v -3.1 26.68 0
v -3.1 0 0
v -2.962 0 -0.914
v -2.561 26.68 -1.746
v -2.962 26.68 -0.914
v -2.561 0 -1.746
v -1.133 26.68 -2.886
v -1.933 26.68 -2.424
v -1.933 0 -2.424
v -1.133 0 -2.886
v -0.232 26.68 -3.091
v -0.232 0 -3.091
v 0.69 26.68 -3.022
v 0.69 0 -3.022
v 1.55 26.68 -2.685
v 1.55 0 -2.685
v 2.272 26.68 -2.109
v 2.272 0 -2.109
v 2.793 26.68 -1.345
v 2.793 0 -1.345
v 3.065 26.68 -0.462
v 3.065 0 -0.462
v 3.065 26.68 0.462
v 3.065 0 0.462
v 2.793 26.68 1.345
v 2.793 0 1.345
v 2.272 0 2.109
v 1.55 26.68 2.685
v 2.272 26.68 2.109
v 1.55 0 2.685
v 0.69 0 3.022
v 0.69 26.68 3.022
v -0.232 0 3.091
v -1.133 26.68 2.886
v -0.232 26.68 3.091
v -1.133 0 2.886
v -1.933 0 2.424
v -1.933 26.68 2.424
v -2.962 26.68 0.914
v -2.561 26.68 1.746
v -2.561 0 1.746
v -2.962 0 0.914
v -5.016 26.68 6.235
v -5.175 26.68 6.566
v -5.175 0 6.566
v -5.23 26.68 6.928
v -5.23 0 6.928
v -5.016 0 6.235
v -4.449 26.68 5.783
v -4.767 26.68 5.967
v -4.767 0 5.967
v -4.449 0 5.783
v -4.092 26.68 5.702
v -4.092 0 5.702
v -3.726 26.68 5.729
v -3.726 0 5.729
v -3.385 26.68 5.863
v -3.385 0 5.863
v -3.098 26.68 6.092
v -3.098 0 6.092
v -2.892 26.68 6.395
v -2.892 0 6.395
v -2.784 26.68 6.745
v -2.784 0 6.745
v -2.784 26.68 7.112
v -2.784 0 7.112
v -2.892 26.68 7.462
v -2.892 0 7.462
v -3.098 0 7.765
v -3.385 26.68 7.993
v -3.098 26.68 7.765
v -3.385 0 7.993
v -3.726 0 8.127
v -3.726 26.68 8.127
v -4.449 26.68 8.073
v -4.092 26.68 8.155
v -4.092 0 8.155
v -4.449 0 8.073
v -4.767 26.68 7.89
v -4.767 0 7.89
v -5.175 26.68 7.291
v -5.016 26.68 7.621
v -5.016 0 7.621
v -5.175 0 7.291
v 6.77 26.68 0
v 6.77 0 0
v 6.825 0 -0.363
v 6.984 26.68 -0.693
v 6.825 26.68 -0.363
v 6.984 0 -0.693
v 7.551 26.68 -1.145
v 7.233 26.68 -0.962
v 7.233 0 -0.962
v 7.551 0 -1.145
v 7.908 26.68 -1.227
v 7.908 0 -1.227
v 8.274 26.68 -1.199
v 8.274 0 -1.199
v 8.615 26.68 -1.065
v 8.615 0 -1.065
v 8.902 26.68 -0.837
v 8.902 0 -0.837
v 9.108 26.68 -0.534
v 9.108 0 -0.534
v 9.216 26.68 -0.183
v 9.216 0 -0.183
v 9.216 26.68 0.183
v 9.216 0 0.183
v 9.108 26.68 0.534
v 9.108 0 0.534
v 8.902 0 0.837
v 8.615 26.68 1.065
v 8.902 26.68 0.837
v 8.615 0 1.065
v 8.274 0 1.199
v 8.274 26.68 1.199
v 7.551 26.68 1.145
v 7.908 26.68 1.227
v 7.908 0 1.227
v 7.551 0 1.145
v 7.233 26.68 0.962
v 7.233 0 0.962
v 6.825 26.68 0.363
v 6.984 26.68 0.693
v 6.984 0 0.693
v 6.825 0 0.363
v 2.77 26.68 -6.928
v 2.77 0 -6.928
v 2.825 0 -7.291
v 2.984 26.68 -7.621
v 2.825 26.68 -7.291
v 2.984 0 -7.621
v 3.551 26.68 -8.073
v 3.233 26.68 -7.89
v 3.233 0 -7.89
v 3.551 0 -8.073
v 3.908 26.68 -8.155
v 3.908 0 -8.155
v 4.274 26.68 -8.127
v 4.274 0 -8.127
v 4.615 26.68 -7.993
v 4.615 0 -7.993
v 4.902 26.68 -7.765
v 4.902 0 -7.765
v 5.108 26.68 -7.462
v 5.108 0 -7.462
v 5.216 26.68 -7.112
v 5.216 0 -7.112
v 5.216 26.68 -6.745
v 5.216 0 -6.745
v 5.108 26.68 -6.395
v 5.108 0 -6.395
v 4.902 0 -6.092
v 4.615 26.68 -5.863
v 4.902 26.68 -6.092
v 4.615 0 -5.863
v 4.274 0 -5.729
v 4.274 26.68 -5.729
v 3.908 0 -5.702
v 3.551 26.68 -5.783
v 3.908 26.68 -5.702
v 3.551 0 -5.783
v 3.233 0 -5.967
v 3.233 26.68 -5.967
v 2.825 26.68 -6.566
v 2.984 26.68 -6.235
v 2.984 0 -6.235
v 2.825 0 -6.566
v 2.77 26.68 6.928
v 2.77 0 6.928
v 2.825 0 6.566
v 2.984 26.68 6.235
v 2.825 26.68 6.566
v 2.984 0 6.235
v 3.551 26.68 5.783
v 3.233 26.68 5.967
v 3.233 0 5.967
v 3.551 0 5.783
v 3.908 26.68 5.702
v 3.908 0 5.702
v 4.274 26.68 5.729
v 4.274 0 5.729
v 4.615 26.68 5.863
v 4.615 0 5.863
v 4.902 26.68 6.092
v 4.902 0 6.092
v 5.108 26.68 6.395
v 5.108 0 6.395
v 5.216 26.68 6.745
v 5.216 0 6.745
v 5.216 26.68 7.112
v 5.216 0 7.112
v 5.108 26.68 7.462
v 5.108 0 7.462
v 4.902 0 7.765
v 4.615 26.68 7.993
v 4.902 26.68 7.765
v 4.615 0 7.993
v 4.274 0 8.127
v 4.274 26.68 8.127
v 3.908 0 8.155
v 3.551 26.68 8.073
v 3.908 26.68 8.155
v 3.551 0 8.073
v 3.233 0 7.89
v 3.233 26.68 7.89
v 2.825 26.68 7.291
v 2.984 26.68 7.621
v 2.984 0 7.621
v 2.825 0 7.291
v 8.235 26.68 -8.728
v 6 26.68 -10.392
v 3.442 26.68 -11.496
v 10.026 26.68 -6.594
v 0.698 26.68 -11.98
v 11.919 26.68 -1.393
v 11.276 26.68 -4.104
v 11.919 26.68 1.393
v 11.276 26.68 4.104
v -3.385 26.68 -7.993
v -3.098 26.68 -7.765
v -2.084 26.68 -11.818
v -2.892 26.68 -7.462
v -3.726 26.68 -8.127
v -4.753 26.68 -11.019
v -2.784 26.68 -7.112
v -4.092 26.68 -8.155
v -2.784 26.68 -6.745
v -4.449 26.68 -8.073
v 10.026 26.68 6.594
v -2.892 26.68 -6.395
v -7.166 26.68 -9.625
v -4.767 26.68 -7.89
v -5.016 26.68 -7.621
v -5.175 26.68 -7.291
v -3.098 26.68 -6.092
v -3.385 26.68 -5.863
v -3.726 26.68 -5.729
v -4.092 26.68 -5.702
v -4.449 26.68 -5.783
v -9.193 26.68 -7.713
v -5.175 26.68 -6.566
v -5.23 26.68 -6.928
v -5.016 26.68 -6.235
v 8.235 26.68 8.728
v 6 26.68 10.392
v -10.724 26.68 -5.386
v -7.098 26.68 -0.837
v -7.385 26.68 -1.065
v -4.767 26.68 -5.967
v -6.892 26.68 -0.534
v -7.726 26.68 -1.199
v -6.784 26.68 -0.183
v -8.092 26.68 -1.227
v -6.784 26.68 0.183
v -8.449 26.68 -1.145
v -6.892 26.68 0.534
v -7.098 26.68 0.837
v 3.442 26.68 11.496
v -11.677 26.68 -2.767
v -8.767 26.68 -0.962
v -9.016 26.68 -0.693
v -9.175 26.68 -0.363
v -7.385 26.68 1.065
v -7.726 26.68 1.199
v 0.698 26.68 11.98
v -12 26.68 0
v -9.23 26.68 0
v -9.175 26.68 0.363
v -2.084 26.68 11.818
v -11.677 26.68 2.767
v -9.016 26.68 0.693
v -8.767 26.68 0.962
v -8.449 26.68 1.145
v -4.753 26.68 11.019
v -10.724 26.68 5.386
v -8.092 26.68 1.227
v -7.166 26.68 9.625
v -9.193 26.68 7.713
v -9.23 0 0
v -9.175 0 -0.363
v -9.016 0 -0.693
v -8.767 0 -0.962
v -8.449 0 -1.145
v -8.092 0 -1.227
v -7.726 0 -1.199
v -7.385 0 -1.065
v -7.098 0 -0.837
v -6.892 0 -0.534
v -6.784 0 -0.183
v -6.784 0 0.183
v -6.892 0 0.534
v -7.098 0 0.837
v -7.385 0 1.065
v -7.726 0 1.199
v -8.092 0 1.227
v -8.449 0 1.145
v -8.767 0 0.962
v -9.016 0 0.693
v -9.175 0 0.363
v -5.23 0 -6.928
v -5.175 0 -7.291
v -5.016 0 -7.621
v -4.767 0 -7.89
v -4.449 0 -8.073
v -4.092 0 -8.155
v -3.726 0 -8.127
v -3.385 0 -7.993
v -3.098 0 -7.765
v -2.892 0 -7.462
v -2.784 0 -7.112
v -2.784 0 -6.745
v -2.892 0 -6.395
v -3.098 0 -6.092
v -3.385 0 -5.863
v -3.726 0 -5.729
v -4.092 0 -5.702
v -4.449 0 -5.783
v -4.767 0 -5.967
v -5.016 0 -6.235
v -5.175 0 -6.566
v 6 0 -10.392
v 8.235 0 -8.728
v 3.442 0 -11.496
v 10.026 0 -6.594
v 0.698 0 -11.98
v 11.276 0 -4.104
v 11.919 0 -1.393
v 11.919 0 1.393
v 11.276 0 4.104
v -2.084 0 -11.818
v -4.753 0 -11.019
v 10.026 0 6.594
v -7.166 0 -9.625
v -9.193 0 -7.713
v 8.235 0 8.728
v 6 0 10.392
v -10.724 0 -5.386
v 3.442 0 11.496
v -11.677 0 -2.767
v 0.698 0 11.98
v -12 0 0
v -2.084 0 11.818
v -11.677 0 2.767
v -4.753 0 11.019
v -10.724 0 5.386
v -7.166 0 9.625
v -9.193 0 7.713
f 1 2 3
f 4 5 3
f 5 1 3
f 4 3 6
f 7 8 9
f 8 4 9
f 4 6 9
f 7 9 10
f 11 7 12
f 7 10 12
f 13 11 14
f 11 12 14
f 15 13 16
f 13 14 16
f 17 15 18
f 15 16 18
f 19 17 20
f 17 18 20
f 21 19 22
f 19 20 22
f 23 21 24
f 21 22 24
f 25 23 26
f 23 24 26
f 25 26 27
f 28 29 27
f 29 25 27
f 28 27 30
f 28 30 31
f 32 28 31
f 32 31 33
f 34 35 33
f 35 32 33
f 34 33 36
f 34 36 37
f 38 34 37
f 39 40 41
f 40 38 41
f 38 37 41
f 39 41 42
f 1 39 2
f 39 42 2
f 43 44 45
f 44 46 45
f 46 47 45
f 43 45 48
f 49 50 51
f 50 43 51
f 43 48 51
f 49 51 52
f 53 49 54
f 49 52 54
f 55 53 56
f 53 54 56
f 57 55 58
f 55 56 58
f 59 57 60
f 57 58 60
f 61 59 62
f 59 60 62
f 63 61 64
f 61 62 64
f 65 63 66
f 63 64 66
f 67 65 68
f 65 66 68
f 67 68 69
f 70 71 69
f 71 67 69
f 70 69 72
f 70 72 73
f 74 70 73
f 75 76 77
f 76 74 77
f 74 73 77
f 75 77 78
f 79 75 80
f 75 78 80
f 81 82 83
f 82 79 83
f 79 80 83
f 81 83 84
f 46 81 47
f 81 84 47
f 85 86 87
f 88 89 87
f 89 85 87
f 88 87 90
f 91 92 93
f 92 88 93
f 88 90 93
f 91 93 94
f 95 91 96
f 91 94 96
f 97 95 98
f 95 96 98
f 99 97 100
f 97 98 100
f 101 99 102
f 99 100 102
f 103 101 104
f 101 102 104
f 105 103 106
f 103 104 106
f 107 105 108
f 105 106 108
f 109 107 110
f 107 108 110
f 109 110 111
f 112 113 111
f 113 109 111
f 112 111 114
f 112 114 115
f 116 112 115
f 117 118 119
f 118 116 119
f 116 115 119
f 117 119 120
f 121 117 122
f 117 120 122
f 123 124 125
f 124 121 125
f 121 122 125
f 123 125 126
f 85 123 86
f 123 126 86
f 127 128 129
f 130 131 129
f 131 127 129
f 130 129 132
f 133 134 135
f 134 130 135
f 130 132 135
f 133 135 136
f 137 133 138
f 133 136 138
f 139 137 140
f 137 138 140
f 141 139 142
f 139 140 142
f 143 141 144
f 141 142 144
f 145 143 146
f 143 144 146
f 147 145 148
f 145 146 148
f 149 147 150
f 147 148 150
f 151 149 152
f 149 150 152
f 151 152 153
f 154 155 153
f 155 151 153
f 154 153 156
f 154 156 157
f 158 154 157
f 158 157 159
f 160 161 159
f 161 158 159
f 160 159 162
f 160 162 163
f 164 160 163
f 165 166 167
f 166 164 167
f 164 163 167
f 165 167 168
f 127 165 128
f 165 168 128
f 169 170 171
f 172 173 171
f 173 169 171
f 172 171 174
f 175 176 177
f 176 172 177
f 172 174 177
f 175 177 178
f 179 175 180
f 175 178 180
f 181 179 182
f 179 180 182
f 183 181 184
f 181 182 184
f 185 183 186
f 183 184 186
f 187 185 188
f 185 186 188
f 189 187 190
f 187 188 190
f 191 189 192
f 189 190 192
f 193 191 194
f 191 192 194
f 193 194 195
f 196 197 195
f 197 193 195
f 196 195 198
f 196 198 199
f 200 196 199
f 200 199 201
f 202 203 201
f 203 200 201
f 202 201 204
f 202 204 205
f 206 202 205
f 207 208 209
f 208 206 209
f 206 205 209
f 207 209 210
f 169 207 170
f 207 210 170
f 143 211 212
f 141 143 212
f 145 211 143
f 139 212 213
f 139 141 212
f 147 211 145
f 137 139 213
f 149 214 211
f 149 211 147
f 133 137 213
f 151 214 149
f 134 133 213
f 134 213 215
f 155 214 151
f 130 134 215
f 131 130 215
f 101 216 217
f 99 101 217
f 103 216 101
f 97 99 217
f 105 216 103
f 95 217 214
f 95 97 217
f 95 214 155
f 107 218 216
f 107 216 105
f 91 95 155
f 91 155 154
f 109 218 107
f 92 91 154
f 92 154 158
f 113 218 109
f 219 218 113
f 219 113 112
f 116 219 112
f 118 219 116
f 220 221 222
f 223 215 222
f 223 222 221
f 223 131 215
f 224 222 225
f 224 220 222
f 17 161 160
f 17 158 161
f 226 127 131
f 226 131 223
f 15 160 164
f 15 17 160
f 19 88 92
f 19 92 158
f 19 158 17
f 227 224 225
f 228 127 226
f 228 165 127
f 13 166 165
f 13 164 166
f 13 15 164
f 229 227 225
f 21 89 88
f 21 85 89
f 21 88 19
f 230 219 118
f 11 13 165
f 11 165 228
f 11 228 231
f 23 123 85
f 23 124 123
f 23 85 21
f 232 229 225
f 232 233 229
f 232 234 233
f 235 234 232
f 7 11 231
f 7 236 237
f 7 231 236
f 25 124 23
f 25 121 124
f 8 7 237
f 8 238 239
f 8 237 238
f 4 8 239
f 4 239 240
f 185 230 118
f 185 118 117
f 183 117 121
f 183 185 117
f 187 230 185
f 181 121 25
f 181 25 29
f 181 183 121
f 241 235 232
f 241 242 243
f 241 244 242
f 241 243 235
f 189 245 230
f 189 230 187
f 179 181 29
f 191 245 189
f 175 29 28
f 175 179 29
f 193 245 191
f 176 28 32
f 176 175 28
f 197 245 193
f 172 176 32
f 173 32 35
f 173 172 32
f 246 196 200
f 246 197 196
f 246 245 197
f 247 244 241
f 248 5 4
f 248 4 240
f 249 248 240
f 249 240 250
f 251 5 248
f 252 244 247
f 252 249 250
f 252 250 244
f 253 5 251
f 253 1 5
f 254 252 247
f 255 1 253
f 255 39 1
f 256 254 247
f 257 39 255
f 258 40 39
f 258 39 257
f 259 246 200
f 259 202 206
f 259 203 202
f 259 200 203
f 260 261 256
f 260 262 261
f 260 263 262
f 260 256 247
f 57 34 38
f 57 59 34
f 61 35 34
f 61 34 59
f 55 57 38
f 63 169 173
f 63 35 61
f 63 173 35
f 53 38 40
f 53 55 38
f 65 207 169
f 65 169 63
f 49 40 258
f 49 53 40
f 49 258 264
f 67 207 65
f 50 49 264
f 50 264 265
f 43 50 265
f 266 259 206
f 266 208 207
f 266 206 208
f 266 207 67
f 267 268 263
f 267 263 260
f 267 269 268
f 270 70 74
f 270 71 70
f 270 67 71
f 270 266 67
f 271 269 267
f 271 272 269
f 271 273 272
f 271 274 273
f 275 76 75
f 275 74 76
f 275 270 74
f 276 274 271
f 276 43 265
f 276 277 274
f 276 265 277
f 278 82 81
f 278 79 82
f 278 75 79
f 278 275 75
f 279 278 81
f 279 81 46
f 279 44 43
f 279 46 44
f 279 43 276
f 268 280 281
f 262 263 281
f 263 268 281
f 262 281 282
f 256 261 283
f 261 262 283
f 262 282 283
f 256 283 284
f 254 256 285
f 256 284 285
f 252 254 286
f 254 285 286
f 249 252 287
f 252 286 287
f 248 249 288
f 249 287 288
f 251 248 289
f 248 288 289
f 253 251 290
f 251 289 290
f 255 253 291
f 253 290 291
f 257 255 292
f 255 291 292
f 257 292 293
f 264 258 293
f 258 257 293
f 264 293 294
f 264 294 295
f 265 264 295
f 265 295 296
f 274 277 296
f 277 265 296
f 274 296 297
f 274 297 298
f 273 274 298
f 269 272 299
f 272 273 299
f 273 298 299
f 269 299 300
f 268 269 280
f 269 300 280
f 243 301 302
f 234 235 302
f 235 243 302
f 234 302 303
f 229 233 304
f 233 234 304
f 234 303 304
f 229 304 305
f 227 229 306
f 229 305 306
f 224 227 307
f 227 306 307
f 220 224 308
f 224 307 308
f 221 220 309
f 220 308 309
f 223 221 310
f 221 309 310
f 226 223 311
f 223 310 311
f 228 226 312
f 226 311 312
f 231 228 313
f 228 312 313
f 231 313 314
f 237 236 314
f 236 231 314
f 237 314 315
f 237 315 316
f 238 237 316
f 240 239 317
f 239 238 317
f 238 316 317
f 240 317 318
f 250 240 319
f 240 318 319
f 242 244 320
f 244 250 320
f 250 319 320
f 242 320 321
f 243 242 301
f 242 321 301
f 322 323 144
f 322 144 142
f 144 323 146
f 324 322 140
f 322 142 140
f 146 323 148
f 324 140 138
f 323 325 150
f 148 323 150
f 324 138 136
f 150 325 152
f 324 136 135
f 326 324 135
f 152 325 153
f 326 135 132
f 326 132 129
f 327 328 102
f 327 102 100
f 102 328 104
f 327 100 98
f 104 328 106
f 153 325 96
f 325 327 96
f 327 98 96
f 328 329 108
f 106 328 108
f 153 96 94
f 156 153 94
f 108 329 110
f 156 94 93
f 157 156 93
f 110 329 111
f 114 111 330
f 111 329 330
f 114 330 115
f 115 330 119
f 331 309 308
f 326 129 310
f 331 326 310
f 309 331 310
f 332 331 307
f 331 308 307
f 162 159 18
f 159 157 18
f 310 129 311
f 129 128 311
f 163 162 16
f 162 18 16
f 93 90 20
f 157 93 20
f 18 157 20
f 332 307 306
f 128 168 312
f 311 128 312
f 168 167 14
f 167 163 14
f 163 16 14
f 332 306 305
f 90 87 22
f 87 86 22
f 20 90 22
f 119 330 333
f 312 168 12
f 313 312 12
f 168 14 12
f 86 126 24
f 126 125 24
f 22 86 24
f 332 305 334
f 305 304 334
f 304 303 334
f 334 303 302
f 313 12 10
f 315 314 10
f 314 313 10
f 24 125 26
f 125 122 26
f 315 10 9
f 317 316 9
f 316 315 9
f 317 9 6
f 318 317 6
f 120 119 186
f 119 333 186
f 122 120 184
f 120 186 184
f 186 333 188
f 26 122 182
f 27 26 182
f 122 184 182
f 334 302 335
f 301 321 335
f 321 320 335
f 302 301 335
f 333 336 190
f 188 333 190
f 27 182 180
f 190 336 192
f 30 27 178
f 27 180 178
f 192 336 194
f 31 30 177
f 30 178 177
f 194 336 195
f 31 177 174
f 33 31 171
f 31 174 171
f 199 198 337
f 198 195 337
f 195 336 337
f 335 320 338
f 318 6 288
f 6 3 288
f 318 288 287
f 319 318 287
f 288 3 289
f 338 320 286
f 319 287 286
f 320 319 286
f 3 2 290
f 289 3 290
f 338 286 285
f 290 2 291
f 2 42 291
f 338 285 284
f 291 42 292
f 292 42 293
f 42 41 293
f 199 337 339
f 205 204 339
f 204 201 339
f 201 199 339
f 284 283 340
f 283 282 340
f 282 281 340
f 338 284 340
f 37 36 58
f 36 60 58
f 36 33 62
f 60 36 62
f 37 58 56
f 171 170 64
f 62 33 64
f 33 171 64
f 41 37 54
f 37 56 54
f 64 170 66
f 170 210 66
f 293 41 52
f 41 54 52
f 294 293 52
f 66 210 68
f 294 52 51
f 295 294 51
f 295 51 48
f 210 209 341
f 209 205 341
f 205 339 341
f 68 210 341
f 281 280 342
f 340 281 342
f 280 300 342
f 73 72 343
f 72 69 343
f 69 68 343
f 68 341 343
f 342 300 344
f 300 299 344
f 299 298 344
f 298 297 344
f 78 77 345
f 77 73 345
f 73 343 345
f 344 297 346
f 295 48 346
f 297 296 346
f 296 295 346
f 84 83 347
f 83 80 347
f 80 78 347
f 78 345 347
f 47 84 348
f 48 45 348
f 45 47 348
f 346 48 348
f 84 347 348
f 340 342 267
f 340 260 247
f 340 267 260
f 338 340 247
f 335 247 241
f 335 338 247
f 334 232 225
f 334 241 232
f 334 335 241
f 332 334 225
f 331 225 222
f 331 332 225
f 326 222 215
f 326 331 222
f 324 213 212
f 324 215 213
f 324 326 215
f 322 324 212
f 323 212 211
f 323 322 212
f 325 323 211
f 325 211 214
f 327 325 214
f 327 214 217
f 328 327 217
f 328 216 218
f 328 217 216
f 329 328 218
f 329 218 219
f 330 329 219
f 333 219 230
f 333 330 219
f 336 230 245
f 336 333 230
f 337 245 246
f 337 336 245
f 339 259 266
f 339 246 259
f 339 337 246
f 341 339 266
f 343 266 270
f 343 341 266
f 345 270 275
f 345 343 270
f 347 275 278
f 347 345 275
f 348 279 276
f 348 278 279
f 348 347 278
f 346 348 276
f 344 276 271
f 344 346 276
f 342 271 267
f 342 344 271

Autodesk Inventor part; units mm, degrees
ref_plane "YZ Plane" through (0, 0, 0) normal (1, 0, 0) x (0, 1, 0)
ref_plane "XZ Plane" through (0, 0, 0) normal (0, 1, 0) x (-1, 0, 0)
ref_plane "XY Plane" through (0, 0, 0) normal (0, 0, 1) x (1, 0, 0)
sketch "Sketch2" plane through (0, 0, 0) normal (0, 1, 0) x (-1, 0, 0)
  circle A0 centre (0, 0) radius 3.1
  circle A1 centre (0, 0) radius 12
  circle A2 centre (8, 0) radius 1.23
  circle A3 centre (4, 6.9282) radius 1.23
  circle A4 centre (-4, 6.9282) radius 1.23
  circle A5 centre (-8, 0) radius 1.23
  circle A6 centre (-4, -6.9282) radius 1.23
  circle A7 centre (4, -6.9282) radius 1.23
  dimension "d12" = 6.2
  dimension "d14" = 24
  dimension "d15" = 2.46
  dimension "d16" = 0
  dimension "d17" = 8
  dimension "d20" = 360
extrude "Extrusion2" add sketch "Sketch2" along normal blind 26.68
properties part number "smallSprocketHolder" material "ABS Plastic"
